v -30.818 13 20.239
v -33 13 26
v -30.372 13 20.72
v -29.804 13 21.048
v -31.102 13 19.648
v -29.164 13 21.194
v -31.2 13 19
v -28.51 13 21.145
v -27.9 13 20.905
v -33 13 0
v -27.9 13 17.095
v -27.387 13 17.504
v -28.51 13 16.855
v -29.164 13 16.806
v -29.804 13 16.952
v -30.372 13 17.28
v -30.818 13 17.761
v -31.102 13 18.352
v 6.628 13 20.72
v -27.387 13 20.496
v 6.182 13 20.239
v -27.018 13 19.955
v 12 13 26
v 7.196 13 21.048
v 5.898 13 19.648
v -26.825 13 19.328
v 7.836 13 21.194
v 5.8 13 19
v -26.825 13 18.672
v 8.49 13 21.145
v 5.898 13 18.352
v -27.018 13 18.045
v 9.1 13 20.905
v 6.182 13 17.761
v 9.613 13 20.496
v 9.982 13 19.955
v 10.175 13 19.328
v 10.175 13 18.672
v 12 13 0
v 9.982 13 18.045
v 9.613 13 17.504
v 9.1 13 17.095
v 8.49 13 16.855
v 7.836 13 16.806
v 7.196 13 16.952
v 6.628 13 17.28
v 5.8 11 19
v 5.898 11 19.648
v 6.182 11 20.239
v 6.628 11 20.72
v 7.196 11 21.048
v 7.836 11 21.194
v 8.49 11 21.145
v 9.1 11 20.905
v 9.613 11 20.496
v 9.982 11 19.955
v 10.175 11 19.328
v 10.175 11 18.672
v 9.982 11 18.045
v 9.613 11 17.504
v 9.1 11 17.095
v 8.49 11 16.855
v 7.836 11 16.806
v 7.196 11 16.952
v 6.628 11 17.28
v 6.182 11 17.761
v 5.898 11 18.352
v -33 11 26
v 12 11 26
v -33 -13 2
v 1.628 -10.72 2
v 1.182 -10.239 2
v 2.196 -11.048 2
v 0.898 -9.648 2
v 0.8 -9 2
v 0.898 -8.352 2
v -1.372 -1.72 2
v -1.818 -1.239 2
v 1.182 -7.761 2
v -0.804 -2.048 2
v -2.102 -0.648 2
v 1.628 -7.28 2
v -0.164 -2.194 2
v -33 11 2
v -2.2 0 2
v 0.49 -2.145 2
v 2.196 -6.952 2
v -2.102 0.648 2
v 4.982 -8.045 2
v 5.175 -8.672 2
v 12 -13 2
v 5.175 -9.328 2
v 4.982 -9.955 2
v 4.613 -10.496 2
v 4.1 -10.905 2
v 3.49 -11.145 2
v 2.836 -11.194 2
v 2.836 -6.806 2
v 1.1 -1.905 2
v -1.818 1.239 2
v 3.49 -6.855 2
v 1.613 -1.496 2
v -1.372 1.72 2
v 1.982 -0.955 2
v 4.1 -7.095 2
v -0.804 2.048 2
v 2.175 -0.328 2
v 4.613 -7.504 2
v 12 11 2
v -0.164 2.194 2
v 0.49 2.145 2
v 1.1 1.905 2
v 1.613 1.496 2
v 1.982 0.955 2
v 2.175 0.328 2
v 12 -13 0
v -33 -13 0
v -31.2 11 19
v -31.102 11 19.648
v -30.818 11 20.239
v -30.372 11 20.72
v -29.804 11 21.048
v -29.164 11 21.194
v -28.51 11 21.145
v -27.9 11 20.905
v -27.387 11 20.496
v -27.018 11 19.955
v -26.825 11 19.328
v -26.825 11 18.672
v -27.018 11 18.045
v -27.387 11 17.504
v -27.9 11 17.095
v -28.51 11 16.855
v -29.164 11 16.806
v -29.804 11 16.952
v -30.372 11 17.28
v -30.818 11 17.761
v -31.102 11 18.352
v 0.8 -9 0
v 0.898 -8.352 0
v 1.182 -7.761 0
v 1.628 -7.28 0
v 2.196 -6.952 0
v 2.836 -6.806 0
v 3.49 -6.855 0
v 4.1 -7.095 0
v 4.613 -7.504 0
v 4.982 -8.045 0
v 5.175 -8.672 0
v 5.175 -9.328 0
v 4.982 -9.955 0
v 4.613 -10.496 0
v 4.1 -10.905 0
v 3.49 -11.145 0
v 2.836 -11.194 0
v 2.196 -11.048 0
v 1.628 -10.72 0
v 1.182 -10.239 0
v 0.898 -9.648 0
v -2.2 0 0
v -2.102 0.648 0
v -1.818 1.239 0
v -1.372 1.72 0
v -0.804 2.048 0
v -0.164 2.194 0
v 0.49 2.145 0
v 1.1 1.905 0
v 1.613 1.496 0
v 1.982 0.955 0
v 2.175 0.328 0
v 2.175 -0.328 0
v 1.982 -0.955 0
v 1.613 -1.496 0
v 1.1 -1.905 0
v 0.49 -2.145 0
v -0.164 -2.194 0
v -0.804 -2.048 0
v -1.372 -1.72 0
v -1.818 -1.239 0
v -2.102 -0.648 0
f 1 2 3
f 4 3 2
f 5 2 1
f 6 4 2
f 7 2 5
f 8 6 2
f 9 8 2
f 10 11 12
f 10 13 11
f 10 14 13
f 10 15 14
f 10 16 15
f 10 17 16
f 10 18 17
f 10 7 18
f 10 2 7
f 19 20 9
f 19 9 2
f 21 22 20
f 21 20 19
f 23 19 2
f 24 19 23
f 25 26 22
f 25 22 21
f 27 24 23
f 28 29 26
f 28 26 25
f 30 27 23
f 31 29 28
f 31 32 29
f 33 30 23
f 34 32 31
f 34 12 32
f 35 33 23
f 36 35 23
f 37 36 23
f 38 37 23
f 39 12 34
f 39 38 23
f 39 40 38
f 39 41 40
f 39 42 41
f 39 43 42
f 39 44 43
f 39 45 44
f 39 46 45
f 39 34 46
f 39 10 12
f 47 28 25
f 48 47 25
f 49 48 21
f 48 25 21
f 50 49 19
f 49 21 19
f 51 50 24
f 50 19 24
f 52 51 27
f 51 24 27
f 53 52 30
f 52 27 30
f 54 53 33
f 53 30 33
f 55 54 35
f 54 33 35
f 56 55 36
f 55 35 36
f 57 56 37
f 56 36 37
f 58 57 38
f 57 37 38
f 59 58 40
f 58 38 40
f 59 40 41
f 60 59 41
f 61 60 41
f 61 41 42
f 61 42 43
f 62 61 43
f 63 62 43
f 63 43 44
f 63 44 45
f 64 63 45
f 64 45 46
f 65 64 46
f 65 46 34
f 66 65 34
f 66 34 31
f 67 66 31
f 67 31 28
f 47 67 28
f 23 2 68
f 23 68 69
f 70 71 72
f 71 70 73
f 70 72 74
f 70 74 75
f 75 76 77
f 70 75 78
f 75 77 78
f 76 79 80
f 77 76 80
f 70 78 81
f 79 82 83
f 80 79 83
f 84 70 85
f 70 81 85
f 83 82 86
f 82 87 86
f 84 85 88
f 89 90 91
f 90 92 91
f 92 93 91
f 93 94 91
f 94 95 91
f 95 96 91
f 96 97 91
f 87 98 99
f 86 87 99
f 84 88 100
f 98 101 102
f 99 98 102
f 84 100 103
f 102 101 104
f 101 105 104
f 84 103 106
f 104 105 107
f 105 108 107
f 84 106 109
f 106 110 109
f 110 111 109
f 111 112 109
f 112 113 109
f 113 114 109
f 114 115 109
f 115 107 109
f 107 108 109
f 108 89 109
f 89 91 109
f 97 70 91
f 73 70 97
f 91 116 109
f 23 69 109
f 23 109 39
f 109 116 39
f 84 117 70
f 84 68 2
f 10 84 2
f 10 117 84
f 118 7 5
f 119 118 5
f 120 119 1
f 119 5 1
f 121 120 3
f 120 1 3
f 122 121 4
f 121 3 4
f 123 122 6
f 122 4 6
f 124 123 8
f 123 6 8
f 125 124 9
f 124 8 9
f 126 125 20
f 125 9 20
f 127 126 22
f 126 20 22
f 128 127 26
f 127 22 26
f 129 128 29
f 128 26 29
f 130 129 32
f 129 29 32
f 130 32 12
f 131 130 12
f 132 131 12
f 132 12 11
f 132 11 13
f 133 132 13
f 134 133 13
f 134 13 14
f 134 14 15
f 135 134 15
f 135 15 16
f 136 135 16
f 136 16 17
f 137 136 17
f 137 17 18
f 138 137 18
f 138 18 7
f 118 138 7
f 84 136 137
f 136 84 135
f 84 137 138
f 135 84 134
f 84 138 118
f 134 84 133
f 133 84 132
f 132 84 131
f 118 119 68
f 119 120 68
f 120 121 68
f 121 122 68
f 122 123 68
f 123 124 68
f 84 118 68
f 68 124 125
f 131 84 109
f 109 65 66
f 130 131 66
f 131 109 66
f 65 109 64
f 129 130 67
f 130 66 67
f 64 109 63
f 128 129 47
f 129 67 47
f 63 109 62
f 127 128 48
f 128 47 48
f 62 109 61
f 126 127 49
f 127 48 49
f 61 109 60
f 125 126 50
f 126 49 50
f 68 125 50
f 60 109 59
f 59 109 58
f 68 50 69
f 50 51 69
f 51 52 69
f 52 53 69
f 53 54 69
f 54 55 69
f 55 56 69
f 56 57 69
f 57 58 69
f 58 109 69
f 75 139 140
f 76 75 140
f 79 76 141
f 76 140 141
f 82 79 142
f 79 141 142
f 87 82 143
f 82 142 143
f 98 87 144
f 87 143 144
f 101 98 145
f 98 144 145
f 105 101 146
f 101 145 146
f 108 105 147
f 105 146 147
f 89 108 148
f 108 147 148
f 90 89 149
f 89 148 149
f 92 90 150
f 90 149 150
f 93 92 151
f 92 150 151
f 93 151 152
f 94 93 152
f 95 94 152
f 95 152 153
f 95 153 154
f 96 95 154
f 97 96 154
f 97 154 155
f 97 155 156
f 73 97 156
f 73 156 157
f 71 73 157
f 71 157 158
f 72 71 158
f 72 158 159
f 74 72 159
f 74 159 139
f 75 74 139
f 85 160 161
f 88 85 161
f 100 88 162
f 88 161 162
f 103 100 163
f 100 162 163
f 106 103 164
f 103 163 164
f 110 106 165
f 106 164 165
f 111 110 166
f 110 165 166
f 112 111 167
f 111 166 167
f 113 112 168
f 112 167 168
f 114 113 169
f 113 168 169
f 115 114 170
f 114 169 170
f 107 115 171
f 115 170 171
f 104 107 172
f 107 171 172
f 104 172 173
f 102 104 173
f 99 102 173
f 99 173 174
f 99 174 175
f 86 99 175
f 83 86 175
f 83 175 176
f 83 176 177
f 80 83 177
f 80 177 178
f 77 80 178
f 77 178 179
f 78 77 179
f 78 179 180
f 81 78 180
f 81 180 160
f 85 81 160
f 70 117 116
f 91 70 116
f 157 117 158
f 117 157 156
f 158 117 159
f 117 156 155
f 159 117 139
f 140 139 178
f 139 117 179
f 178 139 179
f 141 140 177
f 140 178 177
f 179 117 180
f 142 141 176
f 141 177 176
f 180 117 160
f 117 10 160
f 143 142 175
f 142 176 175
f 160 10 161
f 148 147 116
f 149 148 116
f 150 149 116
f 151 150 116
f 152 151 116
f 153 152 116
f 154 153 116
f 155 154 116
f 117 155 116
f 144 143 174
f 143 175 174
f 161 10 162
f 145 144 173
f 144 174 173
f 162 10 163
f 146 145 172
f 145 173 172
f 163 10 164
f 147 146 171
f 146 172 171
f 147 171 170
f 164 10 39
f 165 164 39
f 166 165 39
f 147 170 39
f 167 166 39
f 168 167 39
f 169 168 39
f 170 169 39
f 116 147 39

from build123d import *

# Parameters (mm, degrees)
F0_W     = 45
F0_H     = 26
F1_DEPTH = 26
F2_W     = 24
F2_H     = 24
F3_DEPTH = 45.001
F5_D     = 4.4
F7_D     = 4.4


with BuildPart() as f1:
    # F0 (on Top) → F1 (new body)
    with BuildSketch(Plane.XY):
        with Locations((-10.5, 0)):
            Rectangle(F0_W, F0_H)
    extrude(amount=F1_DEPTH)

    # F2 (on face) → F3 (cut, through all)
    with BuildSketch(Plane.YZ.offset(12)):
        with Locations((-1, 14)):
            Rectangle(F2_W, F2_H)
    extrude(amount=-F3_DEPTH, mode=Mode.SUBTRACT)

    # F5 (through all)
    with Locations(Plane.XY.offset(2)):
        with Locations((0, 0), (3, -9)):
            Hole(F5_D / 2)

    # F7 (through all)
    with Locations(Plane.XZ.offset(-11)):
        with Locations((-29, 19), (8, 19)):
            Hole(F7_D / 2)


solid = f1.part
